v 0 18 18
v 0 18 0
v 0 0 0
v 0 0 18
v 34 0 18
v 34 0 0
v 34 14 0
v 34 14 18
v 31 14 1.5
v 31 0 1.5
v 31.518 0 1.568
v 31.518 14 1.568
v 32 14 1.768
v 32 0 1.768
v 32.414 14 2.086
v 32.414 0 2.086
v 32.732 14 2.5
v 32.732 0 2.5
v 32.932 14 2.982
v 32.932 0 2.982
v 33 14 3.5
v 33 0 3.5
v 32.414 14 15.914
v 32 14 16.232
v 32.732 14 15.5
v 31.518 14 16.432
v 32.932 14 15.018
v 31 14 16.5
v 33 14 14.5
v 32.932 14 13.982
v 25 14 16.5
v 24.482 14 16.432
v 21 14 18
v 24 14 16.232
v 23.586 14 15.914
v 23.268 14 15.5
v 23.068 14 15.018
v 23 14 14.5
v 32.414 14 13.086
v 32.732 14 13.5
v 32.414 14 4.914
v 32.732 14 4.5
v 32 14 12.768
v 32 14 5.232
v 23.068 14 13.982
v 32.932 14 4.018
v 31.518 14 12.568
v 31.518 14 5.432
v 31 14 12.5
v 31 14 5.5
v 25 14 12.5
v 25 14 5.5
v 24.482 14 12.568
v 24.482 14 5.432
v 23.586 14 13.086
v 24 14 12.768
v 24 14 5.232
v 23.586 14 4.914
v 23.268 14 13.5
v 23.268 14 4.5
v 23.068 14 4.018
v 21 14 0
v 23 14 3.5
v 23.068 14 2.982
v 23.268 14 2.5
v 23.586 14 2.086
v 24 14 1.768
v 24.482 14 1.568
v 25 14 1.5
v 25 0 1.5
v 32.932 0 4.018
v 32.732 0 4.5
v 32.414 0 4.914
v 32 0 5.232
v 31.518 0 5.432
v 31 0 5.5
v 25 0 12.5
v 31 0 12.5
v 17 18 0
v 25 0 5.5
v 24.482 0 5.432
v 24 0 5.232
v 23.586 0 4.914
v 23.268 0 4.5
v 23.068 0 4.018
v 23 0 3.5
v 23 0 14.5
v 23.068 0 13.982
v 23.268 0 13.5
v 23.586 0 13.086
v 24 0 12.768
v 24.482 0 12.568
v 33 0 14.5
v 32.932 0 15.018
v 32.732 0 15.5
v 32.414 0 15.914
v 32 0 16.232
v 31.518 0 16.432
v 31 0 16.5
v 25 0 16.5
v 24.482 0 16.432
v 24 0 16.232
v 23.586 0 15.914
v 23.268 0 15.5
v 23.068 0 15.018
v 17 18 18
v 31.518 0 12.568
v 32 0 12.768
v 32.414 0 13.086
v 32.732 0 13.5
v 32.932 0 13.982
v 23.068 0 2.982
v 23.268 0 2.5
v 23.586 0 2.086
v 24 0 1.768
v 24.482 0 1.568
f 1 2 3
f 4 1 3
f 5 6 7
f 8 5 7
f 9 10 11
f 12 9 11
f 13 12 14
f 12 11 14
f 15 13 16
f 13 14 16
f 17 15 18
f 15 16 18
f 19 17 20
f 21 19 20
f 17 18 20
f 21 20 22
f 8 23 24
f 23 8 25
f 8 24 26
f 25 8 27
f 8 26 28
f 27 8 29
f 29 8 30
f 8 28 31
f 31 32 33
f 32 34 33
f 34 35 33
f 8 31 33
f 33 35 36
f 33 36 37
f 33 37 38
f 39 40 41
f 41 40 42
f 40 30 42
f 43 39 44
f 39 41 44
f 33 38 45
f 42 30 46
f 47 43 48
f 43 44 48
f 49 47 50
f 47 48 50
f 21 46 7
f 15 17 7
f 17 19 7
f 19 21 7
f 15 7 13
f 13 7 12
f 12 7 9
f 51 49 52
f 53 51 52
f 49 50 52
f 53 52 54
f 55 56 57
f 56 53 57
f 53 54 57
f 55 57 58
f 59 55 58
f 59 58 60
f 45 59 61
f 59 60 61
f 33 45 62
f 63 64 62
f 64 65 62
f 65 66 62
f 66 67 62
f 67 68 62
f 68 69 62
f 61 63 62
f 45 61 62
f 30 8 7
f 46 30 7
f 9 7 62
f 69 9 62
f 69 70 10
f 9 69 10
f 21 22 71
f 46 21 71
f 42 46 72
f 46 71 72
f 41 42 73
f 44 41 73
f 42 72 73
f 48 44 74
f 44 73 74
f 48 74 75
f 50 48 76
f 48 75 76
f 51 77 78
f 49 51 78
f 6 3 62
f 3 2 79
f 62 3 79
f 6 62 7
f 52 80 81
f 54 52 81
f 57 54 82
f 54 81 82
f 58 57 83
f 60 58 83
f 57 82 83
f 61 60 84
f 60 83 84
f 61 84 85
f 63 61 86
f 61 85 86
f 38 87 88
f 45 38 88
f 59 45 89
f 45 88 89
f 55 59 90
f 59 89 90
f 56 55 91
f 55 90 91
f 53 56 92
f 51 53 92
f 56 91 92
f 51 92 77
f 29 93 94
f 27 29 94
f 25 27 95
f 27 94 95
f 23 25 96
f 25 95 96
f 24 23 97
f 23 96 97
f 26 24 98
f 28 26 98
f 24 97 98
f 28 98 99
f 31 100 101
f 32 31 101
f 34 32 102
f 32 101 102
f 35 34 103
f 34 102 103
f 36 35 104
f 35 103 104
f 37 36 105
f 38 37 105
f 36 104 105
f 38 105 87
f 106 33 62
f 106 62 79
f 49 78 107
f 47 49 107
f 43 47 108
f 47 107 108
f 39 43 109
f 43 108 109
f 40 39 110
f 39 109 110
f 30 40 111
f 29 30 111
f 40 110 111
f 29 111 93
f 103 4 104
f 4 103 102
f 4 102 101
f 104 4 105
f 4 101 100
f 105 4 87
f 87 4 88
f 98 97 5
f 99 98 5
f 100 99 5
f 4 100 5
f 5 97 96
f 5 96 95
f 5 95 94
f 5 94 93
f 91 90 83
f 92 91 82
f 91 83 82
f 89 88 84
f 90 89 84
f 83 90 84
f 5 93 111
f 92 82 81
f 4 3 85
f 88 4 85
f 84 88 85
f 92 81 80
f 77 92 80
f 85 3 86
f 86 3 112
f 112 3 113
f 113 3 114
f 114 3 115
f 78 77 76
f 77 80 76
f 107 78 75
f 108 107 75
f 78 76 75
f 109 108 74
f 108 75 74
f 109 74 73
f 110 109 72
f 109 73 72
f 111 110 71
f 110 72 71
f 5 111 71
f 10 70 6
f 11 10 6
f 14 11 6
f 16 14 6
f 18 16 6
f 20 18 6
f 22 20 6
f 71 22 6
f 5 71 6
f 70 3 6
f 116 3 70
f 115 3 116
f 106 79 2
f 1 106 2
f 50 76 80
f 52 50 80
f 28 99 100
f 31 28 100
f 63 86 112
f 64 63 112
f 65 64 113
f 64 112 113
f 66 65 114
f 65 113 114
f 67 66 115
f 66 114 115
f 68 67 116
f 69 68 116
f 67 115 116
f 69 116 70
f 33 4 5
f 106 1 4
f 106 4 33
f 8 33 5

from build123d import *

# Parameters (mm, degrees)
F1_DEPTH = 18
F3_DEPTH = 15


with BuildPart() as f1:
    # F0 (on Top) → F1 (new body)
    with BuildSketch(Plane.XY):
        Polygon((0, 18), (0, 0), (34, 0), (34, 14), (21, 14), (17, 18), align=None)
    extrude(amount=F1_DEPTH)

    # F2 (on Front) → F3 (cut)
    with BuildSketch(Plane.XZ):
        with BuildLine():
            ThreePointArc((33, 14.5), (32.414214, 15.914214), (31, 16.5))
            Line((31, 16.5), (25, 16.5))
            ThreePointArc((25, 16.5), (23.585786, 15.914214), (23, 14.5))
            ThreePointArc((23, 14.5), (23.585786, 13.085786), (25, 12.5))
            Line((25, 12.5), (31, 12.5))
            ThreePointArc((31, 12.5), (32.414214, 13.085786), (33, 14.5))
        make_face()
        with BuildLine():
            ThreePointArc((23, 3.5), (23.585786, 2.085786), (25, 1.5))
            Line((25, 1.5), (31, 1.5))
            ThreePointArc((31, 1.5), (32.414214, 2.085786), (33, 3.5))
            ThreePointArc((33, 3.5), (32.414214, 4.914214), (31, 5.5))
            Line((31, 5.5), (25, 5.5))
            ThreePointArc((25, 5.5), (23.585786, 4.914214), (23, 3.5))
        make_face()
    extrude(amount=-F3_DEPTH, mode=Mode.SUBTRACT)


solid = f1.part
